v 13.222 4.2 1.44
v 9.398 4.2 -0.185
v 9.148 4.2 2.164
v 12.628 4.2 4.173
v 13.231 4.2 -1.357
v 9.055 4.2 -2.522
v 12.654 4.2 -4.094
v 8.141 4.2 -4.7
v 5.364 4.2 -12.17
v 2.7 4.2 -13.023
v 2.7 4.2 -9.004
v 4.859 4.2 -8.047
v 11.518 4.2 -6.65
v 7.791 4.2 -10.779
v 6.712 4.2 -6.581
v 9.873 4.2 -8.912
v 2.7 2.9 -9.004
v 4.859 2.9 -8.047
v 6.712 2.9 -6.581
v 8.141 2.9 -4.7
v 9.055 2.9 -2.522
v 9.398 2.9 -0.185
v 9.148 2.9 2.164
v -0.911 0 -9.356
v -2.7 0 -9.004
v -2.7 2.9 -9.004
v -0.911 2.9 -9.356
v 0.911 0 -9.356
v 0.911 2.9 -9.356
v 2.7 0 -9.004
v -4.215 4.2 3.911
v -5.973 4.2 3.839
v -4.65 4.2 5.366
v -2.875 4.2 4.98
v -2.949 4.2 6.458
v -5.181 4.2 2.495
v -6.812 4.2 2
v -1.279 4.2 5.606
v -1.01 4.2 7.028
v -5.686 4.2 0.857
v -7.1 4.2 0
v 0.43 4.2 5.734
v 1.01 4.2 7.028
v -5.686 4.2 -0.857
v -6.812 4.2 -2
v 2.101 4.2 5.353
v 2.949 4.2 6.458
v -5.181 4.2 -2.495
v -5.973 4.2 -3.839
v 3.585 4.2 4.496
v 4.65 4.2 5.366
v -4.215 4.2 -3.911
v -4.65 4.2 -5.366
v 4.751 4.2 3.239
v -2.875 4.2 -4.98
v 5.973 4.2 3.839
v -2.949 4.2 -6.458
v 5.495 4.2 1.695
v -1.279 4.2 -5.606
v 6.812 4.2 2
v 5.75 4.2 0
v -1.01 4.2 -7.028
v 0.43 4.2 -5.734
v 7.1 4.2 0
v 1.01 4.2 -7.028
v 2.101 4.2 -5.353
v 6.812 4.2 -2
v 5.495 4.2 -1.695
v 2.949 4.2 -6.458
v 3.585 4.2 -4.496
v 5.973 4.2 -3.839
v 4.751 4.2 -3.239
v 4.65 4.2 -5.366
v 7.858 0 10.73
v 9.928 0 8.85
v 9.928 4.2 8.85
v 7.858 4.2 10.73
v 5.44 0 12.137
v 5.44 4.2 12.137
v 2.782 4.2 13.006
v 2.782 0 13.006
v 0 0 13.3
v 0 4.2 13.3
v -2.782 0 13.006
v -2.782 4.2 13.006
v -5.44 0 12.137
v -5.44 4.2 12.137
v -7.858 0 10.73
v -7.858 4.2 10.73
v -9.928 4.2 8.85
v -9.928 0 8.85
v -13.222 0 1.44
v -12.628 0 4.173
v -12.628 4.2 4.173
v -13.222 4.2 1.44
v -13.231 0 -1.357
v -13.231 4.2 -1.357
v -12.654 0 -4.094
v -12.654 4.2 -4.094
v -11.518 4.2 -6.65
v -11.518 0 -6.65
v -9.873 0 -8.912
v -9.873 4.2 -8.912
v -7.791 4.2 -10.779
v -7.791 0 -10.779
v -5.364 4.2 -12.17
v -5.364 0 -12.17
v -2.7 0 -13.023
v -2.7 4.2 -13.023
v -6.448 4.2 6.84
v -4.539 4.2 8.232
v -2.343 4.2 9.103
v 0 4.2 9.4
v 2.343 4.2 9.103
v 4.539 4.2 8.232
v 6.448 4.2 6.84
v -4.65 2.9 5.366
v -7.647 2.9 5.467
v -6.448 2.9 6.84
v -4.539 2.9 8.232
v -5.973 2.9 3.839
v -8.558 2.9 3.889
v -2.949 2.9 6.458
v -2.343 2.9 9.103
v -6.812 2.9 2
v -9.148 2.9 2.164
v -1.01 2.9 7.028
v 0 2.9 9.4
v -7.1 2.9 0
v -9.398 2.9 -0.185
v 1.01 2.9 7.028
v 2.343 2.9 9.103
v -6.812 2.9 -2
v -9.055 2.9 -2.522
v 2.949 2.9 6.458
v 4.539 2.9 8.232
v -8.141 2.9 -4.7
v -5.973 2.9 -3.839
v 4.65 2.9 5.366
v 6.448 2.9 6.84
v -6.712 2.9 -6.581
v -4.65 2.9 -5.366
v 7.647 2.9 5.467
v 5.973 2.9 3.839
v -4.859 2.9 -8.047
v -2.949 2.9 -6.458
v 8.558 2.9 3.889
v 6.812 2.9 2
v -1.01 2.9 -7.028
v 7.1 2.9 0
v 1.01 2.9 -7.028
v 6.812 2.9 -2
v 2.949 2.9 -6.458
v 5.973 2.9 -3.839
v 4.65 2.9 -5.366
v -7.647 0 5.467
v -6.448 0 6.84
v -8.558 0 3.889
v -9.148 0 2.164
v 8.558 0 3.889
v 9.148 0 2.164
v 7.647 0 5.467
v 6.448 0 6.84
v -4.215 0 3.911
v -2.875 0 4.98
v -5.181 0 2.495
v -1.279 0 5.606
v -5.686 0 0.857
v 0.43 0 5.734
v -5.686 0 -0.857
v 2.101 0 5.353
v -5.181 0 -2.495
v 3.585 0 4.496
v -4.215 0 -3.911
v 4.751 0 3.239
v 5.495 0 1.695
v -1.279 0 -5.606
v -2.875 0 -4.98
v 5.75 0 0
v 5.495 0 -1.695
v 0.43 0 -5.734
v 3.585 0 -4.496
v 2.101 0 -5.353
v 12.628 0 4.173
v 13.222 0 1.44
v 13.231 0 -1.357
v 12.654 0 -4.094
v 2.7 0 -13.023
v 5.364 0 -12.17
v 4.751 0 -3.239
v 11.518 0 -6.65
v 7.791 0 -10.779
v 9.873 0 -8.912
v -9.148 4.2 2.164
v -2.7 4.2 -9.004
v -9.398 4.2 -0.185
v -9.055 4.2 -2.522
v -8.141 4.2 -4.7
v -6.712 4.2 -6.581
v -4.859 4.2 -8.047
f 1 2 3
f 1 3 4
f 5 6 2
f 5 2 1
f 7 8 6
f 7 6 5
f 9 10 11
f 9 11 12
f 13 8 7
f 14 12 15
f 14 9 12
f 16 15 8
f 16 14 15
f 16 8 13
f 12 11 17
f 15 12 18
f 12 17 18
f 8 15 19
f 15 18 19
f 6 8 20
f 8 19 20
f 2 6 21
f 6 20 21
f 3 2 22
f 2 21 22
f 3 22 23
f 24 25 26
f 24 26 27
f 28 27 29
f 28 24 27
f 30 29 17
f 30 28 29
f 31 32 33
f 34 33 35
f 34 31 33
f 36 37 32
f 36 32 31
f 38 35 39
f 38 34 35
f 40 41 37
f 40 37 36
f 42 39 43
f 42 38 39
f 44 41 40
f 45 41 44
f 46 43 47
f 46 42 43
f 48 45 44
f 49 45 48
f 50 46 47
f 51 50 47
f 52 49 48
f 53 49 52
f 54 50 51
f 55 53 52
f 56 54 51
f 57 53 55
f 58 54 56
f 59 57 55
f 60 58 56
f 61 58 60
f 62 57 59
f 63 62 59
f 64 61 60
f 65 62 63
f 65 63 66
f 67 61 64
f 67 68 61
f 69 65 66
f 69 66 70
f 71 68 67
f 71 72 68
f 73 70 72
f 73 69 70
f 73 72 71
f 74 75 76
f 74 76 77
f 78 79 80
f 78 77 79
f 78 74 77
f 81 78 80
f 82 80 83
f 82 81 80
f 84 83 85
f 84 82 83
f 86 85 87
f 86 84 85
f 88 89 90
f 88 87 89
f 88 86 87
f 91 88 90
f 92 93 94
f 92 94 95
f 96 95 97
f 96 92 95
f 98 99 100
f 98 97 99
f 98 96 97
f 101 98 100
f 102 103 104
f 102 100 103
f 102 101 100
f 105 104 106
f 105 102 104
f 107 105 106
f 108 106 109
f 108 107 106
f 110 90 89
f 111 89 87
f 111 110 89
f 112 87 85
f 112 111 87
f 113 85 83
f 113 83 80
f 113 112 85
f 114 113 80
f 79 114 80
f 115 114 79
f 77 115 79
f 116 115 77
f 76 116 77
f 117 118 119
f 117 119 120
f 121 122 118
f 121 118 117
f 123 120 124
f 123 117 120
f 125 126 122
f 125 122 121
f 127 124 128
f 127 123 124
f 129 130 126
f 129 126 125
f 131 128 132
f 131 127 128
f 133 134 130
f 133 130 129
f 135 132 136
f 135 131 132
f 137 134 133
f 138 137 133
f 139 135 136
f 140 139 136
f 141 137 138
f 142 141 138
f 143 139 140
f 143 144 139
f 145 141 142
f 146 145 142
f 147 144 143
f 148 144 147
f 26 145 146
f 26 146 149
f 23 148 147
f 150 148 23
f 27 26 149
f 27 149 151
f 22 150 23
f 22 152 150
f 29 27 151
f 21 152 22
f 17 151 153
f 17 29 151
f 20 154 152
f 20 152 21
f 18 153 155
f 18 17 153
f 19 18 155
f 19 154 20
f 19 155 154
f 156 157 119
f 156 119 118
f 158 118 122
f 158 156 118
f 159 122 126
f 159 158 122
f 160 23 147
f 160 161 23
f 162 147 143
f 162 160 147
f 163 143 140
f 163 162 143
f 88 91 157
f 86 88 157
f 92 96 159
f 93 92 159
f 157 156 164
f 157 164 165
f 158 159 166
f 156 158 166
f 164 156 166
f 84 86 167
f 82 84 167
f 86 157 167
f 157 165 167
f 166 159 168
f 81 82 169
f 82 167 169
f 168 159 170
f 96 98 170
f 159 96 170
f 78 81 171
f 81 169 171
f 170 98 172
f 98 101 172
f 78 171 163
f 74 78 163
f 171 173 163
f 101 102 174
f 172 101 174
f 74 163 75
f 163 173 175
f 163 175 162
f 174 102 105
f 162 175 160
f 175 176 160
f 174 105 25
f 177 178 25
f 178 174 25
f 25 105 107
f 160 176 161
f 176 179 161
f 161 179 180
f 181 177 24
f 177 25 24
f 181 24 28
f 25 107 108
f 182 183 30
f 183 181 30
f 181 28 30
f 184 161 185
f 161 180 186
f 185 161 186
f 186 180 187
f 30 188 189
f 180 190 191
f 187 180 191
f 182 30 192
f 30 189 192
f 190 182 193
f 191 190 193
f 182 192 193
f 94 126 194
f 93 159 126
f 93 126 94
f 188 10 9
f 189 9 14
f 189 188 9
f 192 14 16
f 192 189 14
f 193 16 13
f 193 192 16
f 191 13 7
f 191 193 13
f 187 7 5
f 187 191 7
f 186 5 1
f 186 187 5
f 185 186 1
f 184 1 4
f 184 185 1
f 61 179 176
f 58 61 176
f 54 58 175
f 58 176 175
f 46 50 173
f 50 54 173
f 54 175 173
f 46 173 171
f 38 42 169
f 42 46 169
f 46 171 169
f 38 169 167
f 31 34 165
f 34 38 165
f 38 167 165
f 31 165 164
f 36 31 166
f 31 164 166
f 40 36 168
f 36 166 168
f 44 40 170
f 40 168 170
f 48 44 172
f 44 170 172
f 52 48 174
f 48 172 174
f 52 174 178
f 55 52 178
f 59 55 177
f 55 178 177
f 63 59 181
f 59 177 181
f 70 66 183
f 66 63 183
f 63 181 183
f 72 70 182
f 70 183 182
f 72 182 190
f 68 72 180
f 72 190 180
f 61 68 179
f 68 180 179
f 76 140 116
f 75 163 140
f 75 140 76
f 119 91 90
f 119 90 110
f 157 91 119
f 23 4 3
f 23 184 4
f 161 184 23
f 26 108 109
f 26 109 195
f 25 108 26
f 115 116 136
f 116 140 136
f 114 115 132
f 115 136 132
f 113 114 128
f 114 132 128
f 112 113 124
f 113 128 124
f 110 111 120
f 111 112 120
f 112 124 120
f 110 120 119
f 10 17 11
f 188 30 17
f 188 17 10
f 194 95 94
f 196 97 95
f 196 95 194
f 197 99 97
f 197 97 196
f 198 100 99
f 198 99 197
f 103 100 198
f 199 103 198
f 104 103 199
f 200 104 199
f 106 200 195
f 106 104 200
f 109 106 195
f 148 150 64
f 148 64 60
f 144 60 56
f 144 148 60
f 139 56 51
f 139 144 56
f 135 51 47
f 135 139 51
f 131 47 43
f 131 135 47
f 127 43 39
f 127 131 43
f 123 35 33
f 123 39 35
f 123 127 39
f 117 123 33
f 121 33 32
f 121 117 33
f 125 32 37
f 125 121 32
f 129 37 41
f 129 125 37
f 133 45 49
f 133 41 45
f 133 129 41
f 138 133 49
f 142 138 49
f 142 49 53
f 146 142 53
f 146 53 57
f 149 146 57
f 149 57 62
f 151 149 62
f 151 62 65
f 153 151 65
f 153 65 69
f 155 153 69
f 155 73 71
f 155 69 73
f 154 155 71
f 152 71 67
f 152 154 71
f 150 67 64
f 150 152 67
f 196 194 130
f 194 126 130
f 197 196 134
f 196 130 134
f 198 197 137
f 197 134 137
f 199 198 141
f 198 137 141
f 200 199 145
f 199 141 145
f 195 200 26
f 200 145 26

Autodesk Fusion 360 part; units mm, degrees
sketch "Esboço1" plane through (0, 0, 0) normal (0, 1, 0) x (1, 0, 0)
  circle A0 centre (0, 0) radius 13.3
  circle A1 centre (0, 0) radius 9.4
  circle A2 centre (0, 0) radius 7.1
  circle A3 centre (0, 0) radius 5.75
  line L0 (-2.7, 13.0231) -> (-2.7, 9.0039)
  line L1 (2.7, 9.0039) -> (2.7, 13.0231)
  line L2 (0, 0) -> (0, 16.7513) construction
  line L3 (-9.9283, -8.8498) -> (-6.4476, -6.8402)
  line L4 (-9.1476, -2.1637) -> (-12.6283, -4.1733)
  line L5 (12.6283, -4.1733) -> (9.1476, -2.1637)
  line L6 (6.4476, -6.8402) -> (9.9283, -8.8498)
  dimension "d1" = 11.5
  dimension "d2" = 14.2
  dimension "d3" = 18.8
  dimension "d4" = 26.6
  dimension "d5" = 5.4
  dimension "d6" = 2.7
  dimension "d8" = 360
extrude "Extrusão1" add sketch "Esboço1" along normal blind 4.2 contours A0 A1 L1 L5 | A0 A1 L0 L4 | A0 A1 L3 L6 | A2 makes body 1 at (12.9632, 2.8, 2.9742) makes body 2 at (7.0647, 1.4, 0.7069) makes body 3 at (6.551, 2.8, 11.5747) makes body 4 at (-12.8098, 2.8, 3.5776)
extrude "Extrusão2" add sketch "Esboço1" along normal blind 2.9 contours A1 bodies 1 2 3 4
